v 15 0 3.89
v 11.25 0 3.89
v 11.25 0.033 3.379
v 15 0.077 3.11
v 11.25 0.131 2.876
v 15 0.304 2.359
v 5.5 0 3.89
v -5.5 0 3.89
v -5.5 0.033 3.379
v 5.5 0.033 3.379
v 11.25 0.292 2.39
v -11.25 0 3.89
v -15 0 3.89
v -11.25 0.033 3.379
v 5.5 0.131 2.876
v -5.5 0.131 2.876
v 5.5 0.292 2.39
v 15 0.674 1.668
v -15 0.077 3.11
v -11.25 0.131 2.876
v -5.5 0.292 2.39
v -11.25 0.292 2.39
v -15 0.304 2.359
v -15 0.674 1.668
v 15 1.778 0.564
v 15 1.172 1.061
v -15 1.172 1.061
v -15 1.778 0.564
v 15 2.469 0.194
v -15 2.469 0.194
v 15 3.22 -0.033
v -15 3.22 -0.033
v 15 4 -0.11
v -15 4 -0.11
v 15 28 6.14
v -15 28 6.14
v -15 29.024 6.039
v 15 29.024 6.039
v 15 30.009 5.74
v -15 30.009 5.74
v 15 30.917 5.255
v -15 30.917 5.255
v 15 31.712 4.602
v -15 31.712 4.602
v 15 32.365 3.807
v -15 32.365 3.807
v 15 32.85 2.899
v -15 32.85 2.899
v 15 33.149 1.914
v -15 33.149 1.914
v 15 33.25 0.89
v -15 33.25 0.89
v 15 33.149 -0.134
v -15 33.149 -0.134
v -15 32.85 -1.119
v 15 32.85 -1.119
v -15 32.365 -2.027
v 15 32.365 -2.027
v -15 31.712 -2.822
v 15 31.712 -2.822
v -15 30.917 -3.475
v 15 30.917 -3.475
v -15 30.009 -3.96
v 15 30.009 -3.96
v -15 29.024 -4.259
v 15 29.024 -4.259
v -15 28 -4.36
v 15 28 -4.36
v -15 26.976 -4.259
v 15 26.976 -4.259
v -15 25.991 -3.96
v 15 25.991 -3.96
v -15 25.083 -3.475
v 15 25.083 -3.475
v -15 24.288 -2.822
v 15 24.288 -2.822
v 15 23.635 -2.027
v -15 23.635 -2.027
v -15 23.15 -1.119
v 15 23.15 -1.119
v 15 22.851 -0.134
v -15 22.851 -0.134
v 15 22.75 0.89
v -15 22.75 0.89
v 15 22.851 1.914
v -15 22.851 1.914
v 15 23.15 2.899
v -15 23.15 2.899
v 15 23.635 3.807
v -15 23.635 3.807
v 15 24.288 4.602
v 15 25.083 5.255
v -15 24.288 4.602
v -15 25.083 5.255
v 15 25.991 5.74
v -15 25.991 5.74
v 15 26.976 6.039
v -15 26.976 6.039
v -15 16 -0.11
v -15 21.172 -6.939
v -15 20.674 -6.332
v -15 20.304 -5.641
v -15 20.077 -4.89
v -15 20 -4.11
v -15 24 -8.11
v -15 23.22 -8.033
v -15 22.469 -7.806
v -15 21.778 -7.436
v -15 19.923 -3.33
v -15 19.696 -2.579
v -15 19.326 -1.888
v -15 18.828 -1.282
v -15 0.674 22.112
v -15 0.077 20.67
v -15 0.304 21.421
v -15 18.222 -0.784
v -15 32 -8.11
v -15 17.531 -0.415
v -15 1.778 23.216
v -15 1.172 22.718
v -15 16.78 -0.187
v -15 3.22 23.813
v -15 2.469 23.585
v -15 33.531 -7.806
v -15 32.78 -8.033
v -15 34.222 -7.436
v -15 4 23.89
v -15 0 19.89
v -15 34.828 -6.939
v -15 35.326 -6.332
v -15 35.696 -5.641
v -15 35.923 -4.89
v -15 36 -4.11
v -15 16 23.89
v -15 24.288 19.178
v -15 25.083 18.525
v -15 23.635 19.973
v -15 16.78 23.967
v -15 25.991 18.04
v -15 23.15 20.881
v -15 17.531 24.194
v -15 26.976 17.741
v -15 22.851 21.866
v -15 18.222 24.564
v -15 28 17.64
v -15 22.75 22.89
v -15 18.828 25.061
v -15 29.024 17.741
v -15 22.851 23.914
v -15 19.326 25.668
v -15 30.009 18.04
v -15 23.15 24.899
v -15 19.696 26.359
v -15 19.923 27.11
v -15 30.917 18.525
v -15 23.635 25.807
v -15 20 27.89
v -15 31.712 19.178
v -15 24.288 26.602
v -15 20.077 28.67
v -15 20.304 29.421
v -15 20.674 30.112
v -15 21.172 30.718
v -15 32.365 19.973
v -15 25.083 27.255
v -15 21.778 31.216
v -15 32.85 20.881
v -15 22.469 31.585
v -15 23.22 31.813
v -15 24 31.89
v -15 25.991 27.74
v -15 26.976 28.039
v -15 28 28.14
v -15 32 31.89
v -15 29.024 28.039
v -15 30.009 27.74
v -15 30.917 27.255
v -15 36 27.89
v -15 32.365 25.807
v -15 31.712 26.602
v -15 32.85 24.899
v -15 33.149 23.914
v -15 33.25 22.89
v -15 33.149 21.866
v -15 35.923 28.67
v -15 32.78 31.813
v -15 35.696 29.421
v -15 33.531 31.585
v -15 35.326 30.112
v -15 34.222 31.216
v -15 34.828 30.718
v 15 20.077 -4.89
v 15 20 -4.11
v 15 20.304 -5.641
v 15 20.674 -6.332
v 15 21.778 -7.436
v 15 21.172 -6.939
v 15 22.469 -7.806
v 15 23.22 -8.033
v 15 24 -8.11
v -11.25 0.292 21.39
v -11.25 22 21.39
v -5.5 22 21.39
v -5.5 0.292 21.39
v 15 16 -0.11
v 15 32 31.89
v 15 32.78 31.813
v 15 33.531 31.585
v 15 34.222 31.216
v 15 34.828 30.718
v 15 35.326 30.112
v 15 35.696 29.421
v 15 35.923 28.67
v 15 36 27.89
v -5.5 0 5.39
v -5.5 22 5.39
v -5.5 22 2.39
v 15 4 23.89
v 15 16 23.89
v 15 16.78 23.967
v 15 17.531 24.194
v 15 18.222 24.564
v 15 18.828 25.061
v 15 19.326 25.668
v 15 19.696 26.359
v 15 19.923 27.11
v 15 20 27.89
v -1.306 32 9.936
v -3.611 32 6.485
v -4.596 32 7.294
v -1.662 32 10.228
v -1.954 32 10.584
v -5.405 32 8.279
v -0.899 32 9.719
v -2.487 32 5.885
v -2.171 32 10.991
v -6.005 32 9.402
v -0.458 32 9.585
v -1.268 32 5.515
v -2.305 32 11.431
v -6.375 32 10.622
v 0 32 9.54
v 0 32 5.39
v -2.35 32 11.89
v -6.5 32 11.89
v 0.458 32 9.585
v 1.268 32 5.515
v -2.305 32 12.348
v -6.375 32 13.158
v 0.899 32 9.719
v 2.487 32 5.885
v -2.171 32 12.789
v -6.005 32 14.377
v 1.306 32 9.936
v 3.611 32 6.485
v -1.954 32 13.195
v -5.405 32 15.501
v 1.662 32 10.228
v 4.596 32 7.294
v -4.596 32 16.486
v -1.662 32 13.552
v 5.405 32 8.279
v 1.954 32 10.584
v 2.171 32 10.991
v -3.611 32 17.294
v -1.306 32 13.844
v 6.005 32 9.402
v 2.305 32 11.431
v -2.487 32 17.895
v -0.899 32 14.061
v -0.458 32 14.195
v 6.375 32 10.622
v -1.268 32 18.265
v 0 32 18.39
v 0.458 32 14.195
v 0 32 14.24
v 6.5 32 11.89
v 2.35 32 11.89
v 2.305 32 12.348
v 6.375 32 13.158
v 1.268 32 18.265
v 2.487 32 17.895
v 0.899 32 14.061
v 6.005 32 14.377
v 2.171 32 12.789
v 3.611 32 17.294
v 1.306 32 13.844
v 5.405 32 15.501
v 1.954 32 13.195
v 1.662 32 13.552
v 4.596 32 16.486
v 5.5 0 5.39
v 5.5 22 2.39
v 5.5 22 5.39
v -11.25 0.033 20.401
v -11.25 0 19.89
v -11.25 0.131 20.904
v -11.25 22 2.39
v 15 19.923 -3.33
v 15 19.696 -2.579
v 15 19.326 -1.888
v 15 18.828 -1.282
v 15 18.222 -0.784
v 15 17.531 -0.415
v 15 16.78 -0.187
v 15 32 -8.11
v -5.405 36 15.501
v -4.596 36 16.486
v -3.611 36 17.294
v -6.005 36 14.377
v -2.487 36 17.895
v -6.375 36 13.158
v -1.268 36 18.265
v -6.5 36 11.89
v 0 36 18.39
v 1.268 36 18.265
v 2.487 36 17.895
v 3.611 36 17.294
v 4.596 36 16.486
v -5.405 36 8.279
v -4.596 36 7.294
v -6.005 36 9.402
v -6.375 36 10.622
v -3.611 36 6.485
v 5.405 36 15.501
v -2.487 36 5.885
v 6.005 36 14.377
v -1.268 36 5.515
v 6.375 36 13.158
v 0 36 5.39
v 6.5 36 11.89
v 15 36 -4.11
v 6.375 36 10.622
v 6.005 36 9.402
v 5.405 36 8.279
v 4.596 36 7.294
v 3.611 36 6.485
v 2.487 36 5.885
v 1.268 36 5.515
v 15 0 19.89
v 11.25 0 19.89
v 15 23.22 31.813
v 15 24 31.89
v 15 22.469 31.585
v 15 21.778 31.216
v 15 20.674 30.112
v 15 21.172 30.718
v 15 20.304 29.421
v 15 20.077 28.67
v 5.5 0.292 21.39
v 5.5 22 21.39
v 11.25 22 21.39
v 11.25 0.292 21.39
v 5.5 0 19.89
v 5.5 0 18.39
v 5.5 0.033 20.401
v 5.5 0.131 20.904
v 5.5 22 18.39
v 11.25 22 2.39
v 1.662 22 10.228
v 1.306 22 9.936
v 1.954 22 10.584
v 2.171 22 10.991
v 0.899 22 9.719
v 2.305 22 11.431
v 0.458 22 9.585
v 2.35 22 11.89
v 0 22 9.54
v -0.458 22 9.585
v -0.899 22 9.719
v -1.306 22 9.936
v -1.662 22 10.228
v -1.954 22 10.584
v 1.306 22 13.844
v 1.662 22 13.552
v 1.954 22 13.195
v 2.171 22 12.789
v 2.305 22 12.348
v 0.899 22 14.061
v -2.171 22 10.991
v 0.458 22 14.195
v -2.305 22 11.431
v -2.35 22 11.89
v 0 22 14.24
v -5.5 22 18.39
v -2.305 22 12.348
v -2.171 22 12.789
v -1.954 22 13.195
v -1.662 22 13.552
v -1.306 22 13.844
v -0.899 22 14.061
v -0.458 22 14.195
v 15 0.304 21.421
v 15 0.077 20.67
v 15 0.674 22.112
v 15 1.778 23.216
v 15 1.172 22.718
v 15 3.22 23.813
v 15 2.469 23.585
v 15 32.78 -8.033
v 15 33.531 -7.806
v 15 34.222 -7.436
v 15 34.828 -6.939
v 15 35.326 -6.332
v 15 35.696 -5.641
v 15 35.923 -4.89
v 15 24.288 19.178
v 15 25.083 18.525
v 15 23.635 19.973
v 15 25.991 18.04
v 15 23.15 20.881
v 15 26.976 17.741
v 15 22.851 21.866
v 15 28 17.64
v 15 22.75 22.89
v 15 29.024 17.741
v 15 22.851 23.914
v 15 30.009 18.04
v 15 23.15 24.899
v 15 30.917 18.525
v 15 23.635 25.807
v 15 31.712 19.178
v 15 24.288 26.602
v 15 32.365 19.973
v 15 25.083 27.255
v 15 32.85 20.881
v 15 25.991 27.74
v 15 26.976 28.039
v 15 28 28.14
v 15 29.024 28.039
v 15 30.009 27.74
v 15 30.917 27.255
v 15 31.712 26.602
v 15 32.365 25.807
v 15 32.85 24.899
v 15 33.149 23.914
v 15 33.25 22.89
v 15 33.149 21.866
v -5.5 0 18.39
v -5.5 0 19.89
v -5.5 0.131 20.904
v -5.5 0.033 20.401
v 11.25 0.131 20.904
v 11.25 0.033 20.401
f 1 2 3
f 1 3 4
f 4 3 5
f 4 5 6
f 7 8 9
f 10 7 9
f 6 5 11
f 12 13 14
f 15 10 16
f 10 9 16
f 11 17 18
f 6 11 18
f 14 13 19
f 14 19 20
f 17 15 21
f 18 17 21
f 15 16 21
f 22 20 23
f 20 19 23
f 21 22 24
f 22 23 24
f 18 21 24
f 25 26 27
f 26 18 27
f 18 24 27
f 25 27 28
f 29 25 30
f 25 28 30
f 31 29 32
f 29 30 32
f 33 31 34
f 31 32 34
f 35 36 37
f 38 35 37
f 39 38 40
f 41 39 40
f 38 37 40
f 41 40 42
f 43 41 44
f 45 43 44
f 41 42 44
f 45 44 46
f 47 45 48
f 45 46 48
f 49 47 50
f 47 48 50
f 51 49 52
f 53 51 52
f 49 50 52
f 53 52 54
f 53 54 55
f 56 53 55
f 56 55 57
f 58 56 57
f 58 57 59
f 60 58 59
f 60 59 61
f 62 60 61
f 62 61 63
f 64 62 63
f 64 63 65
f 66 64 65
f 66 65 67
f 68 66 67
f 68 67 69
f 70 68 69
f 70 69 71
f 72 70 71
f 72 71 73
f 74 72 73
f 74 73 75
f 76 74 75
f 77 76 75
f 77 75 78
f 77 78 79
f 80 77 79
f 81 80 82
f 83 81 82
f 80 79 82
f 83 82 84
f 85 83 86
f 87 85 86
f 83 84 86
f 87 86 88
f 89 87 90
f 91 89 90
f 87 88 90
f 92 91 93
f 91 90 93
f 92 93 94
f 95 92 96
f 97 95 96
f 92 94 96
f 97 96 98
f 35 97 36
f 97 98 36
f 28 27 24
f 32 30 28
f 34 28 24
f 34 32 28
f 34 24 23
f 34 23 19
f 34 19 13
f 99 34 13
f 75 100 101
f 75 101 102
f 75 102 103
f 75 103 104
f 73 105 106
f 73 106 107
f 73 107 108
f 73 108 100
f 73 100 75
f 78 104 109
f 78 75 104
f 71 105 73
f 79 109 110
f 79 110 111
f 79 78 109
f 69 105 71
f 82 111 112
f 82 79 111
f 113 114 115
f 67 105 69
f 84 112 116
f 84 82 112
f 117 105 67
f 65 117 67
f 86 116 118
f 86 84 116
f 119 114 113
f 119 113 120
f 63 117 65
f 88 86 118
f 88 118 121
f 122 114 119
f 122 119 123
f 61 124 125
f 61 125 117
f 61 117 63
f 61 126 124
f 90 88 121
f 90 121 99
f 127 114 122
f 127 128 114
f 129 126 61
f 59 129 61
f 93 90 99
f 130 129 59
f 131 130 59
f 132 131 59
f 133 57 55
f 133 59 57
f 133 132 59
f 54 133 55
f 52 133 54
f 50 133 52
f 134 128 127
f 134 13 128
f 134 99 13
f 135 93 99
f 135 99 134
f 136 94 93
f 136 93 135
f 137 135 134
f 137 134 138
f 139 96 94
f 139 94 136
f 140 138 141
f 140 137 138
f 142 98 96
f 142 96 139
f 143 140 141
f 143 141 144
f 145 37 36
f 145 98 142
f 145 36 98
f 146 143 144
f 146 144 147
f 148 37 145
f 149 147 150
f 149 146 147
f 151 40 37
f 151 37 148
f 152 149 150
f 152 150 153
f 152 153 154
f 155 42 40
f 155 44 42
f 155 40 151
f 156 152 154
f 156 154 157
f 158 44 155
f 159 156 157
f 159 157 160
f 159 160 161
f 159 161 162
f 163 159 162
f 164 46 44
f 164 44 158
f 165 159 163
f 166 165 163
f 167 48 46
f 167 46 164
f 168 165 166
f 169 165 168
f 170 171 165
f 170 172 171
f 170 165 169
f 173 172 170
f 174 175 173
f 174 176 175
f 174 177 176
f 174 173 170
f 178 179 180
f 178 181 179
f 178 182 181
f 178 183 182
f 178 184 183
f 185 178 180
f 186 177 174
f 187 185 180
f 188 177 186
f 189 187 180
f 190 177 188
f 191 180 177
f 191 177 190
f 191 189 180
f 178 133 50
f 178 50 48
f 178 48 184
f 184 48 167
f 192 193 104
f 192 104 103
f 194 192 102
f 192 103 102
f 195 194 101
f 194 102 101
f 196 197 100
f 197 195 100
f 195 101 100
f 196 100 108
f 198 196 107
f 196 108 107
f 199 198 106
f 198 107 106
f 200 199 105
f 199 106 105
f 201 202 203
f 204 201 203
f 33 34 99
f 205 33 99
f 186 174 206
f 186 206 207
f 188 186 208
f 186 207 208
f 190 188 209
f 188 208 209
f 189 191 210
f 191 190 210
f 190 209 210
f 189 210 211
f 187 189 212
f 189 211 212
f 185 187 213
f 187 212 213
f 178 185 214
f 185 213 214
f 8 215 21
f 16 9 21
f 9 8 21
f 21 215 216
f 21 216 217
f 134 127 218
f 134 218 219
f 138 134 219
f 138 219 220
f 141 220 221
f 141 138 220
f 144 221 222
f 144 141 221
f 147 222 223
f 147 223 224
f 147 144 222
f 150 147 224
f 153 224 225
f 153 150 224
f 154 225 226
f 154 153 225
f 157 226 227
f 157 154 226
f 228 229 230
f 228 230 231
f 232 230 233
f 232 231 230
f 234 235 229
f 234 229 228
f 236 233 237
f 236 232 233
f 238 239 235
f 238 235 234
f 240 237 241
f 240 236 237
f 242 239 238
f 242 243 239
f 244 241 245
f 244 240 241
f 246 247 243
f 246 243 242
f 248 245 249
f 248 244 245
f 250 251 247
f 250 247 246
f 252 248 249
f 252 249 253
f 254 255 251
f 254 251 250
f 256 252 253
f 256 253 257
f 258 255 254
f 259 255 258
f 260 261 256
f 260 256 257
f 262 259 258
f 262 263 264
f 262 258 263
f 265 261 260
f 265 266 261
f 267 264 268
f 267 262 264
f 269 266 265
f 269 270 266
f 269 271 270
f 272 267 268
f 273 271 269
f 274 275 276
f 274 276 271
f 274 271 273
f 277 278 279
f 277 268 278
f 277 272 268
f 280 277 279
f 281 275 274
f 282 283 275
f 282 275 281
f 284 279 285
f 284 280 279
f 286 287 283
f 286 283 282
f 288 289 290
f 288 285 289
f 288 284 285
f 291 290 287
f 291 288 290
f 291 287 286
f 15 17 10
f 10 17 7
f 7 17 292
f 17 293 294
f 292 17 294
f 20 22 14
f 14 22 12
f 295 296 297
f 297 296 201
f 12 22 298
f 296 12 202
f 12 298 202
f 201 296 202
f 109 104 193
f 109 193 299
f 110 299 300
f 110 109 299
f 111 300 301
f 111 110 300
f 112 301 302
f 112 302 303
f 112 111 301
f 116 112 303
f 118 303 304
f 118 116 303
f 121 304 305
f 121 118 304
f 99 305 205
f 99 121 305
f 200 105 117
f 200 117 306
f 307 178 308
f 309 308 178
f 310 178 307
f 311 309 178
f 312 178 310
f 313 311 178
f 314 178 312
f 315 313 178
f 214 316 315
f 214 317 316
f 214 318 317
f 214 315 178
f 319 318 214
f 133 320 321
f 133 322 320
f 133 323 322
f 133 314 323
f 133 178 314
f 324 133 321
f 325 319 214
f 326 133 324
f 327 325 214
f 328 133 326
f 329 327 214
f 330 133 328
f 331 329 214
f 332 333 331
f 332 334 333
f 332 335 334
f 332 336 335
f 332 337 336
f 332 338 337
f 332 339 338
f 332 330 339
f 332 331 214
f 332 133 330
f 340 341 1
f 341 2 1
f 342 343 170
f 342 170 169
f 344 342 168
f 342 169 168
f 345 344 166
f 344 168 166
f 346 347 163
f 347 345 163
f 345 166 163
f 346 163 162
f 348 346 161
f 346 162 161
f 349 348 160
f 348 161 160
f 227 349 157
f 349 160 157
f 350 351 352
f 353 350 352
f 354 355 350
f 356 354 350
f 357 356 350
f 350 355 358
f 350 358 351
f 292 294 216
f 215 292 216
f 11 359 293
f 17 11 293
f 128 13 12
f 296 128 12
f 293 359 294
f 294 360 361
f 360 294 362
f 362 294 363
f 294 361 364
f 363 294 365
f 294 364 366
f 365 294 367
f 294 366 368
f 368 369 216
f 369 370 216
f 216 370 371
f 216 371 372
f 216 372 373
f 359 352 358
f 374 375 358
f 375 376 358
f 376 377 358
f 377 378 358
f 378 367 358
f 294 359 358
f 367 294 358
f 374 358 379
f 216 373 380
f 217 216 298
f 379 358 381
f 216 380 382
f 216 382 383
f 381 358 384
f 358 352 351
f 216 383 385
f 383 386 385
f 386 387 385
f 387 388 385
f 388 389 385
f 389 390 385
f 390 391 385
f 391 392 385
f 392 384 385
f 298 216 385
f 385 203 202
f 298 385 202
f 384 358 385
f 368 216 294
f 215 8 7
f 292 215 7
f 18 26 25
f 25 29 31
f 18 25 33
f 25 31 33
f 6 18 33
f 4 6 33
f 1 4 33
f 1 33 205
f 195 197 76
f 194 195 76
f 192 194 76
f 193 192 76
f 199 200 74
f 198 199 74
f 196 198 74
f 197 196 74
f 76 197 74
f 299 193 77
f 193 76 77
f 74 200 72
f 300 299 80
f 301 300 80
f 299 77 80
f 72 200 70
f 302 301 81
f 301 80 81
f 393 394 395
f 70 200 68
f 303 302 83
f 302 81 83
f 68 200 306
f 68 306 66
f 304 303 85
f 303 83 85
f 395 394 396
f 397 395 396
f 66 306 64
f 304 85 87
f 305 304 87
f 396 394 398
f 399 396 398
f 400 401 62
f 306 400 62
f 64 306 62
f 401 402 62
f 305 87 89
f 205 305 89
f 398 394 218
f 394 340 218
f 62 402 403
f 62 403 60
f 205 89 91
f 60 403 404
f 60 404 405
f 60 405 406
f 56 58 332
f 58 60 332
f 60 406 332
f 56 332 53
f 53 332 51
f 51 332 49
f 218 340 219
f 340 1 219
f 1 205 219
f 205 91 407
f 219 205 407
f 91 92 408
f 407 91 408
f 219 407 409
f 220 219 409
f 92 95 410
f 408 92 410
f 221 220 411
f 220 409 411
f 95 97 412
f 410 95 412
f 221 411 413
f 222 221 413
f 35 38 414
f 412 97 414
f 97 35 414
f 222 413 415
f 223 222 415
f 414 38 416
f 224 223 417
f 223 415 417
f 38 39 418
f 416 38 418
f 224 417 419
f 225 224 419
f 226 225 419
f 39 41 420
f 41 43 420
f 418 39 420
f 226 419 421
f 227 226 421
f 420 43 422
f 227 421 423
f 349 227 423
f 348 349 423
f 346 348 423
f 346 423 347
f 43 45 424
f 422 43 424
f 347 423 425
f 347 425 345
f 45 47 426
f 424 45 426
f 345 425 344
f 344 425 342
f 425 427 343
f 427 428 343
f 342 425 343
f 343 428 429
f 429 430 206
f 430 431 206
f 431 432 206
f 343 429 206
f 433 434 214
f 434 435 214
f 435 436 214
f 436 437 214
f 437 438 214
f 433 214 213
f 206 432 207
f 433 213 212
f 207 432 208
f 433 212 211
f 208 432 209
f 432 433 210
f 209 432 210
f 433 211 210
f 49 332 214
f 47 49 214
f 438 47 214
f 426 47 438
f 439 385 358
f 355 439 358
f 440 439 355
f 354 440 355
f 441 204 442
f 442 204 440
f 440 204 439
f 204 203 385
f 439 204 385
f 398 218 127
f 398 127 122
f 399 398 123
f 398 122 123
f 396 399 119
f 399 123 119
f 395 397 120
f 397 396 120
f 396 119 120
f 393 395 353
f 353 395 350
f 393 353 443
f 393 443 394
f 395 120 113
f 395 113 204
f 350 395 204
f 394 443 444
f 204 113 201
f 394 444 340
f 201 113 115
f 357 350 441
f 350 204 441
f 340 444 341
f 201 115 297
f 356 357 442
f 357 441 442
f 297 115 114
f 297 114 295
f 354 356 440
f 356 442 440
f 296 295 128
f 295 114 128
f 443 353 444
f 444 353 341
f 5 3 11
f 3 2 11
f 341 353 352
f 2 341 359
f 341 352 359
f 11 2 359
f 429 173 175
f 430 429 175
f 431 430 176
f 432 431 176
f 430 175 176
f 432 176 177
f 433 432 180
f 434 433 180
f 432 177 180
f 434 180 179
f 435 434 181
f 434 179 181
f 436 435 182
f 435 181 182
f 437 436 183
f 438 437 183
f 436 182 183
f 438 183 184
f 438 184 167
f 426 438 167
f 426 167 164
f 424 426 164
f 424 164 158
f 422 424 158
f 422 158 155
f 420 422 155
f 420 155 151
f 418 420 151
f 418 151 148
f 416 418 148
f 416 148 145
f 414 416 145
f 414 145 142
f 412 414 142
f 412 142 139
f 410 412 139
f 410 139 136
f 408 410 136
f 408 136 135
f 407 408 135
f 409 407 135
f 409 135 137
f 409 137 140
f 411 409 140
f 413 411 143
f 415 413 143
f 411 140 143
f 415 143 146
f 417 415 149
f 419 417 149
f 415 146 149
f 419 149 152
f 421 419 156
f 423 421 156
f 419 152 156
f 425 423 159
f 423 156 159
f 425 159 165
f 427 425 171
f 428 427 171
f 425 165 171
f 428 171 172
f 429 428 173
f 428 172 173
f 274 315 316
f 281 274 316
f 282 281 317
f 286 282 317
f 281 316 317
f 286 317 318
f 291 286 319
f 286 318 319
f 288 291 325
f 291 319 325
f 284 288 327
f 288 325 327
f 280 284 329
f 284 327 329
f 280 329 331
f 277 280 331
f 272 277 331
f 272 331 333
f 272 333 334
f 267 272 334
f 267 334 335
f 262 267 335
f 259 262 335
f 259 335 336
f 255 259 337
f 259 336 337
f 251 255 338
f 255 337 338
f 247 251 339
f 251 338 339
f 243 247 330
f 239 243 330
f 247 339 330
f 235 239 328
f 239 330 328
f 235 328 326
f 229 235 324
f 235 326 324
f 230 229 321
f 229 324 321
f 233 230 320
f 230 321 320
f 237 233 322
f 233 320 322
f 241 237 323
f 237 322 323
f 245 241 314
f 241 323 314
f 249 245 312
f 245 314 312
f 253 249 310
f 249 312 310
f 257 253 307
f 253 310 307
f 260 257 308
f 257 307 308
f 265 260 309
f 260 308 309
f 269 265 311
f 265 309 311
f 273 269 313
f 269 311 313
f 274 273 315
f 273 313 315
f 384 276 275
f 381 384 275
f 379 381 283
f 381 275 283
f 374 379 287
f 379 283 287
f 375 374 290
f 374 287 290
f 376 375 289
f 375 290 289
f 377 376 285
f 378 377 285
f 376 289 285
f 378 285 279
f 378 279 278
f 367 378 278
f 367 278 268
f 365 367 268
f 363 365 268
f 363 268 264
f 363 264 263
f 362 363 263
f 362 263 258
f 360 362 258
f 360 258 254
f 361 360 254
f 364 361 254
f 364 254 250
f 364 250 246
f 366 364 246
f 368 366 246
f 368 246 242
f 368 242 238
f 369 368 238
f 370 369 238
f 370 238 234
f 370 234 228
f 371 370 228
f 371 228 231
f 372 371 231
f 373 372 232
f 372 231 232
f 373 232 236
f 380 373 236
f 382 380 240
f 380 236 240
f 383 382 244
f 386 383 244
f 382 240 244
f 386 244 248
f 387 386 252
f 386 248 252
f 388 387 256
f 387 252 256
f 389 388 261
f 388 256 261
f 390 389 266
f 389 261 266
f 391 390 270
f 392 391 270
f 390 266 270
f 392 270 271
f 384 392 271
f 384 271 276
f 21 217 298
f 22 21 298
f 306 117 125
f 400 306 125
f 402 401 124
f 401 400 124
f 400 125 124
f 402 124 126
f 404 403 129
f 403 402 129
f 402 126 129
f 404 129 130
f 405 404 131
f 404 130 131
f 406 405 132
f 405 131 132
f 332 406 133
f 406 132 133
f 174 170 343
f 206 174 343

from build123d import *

# Parameters (mm, degrees)
SKETCH1_W           = 30
SKETCH1_H           = 40
BOSS_EXTRUDE1_DEPTH = 36
CUT_EXTRUDE1_START  = 14
CUT_EXTRUDE1_DEPTH  = 37.378214609
SKETCH4_R           = 2.35
CUT_EXTRUDE3_DEPTH  = 51.378214609
SKETCH5_R           = 6.5
CUT_EXTRUDE4_DEPTH  = 4
SKETCH12_R          = 5.25
SKETCH12_W          = 8
SKETCH12_H          = 20
CUT_EXTRUDE5_DEPTH  = 57.683017802
FILLET1_R           = 4


with BuildPart() as part:
    # Sketch1 → Boss-Extrude1 (new body)
    with BuildSketch(Plane(origin=(0, 0, 0), x_dir=(1, 0, 0), z_dir=(0, 1, 0))):
        with Locations((0, -11.889880952)):
            Rectangle(SKETCH1_W, SKETCH1_H)
    extrude(amount=BOSS_EXTRUDE1_DEPTH)

    # Sketch2 → Cut-Extrude1 (cut, through all)
    with BuildSketch(Plane.XZ.offset(-36).offset(CUT_EXTRUDE1_START)):
        Polygon((-11.25, 21.389880952), (-5.5, 21.389880952), (-5.5, 18.389880952), (5.5, 18.389880952), (5.5, 21.389880952), (11.25, 21.389880952), (11.25, 2.389880952), (5.5, 2.389880952), (5.5, 5.389880952), (-5.5, 5.389880952), (-5.5, 2.389880952), (-11.25, 2.389880952), align=None)
    extrude(amount=CUT_EXTRUDE1_DEPTH, mode=Mode.SUBTRACT)

    # Sketch4 → Cut-Extrude3 (cut, through all)
    with BuildSketch(Plane(origin=(0, 36, 0), x_dir=(1, 0, 0), z_dir=(0, 1, 0))):
        with Locations(Location((0, -11.889880952, 0), (0, 0, 270))):
            Circle(SKETCH4_R)
    extrude(amount=-CUT_EXTRUDE3_DEPTH, mode=Mode.SUBTRACT)

    # Sketch5 → Cut-Extrude4 (cut)
    with BuildSketch(Plane(origin=(0, 36, 0), x_dir=(1, 0, 0), z_dir=(0, 1, 0))):
        with Locations(Location((0, -11.889880952, 0), (0, 0, 270))):
            Circle(SKETCH5_R)
    extrude(amount=-CUT_EXTRUDE4_DEPTH, mode=Mode.SUBTRACT)

    # Sketch12 → Cut-Extrude5 (cut, through all)
    with BuildSketch(Plane.ZY.offset(15)):
        with Locations((0.889880952, 28)):
            Circle(SKETCH12_R)
        with Locations((22.889880952, 28)):
            Circle(SKETCH12_R)
        with Locations((-4.110119048, 10)):
            Rectangle(SKETCH12_W, SKETCH12_H)
        with Locations((27.889880952, 10)):
            Rectangle(SKETCH12_W, SKETCH12_H)
    extrude(amount=-CUT_EXTRUDE5_DEPTH, mode=Mode.SUBTRACT)

    # Fillet1
    # the kernel refuses this fillet: 4 mm, written as the material it adds along each edge
    with BuildSketch(Plane(origin=(-15, 20, -0.110119048), x_dir=(0, 0, -1), z_dir=(1, 0, 0)), Plane(origin=(-15, 20, 23.889880952), x_dir=(0, -1, 0), z_dir=(1, 0, 0))) as fillet1_piece_1:
        with BuildLine():
            CenterArc((FILLET1_R, -FILLET1_R), FILLET1_R, 90, 90)
            Line((0, -FILLET1_R), (0, 0))
            Line((0, 0), (FILLET1_R, 0))
        make_face()
    extrude(amount=30)
    # the kernel refuses this fillet: 4 mm, written as the material it takes off along each edge
    with BuildSketch(Plane(origin=(-25, 0, 23.889880952), x_dir=(0, 0, -1), z_dir=(1, 0, 0)), Plane(origin=(-25, 0, -0.110119048), x_dir=(0, 1, 0), z_dir=(1, 0, 0)), Plane(origin=(-25, 20, -8.110119048), x_dir=(0, 1, 0), z_dir=(1, 0, 0)), Plane(origin=(25, 36, 31.889880952), x_dir=(0, 0, -1), z_dir=(-1, 0, 0)), Plane(origin=(-25, 20, 31.889880952), x_dir=(0, 0, -1), z_dir=(1, 0, 0))) as fillet1_2_piece_1:
        with BuildLine():
            CenterArc((FILLET1_R, FILLET1_R), FILLET1_R, 180, 90)
            Line((0, FILLET1_R), (0, 0))
            Line((0, 0), (FILLET1_R, 0))
        make_face()
    extrude(amount=50, mode=Mode.SUBTRACT)
    with BuildSketch(Plane(origin=(-25, 36, -8.110119048), x_dir=(0, -1, 0), z_dir=(1, 0, 0))) as fillet1_2_piece_2:
        with BuildLine():
            CenterArc((FILLET1_R, -FILLET1_R), FILLET1_R, 90, 90)
            Line((0, -FILLET1_R), (0, 0))
            Line((0, 0), (FILLET1_R, 0))
        make_face()
    extrude(amount=50, mode=Mode.SUBTRACT)


solid = part.part
